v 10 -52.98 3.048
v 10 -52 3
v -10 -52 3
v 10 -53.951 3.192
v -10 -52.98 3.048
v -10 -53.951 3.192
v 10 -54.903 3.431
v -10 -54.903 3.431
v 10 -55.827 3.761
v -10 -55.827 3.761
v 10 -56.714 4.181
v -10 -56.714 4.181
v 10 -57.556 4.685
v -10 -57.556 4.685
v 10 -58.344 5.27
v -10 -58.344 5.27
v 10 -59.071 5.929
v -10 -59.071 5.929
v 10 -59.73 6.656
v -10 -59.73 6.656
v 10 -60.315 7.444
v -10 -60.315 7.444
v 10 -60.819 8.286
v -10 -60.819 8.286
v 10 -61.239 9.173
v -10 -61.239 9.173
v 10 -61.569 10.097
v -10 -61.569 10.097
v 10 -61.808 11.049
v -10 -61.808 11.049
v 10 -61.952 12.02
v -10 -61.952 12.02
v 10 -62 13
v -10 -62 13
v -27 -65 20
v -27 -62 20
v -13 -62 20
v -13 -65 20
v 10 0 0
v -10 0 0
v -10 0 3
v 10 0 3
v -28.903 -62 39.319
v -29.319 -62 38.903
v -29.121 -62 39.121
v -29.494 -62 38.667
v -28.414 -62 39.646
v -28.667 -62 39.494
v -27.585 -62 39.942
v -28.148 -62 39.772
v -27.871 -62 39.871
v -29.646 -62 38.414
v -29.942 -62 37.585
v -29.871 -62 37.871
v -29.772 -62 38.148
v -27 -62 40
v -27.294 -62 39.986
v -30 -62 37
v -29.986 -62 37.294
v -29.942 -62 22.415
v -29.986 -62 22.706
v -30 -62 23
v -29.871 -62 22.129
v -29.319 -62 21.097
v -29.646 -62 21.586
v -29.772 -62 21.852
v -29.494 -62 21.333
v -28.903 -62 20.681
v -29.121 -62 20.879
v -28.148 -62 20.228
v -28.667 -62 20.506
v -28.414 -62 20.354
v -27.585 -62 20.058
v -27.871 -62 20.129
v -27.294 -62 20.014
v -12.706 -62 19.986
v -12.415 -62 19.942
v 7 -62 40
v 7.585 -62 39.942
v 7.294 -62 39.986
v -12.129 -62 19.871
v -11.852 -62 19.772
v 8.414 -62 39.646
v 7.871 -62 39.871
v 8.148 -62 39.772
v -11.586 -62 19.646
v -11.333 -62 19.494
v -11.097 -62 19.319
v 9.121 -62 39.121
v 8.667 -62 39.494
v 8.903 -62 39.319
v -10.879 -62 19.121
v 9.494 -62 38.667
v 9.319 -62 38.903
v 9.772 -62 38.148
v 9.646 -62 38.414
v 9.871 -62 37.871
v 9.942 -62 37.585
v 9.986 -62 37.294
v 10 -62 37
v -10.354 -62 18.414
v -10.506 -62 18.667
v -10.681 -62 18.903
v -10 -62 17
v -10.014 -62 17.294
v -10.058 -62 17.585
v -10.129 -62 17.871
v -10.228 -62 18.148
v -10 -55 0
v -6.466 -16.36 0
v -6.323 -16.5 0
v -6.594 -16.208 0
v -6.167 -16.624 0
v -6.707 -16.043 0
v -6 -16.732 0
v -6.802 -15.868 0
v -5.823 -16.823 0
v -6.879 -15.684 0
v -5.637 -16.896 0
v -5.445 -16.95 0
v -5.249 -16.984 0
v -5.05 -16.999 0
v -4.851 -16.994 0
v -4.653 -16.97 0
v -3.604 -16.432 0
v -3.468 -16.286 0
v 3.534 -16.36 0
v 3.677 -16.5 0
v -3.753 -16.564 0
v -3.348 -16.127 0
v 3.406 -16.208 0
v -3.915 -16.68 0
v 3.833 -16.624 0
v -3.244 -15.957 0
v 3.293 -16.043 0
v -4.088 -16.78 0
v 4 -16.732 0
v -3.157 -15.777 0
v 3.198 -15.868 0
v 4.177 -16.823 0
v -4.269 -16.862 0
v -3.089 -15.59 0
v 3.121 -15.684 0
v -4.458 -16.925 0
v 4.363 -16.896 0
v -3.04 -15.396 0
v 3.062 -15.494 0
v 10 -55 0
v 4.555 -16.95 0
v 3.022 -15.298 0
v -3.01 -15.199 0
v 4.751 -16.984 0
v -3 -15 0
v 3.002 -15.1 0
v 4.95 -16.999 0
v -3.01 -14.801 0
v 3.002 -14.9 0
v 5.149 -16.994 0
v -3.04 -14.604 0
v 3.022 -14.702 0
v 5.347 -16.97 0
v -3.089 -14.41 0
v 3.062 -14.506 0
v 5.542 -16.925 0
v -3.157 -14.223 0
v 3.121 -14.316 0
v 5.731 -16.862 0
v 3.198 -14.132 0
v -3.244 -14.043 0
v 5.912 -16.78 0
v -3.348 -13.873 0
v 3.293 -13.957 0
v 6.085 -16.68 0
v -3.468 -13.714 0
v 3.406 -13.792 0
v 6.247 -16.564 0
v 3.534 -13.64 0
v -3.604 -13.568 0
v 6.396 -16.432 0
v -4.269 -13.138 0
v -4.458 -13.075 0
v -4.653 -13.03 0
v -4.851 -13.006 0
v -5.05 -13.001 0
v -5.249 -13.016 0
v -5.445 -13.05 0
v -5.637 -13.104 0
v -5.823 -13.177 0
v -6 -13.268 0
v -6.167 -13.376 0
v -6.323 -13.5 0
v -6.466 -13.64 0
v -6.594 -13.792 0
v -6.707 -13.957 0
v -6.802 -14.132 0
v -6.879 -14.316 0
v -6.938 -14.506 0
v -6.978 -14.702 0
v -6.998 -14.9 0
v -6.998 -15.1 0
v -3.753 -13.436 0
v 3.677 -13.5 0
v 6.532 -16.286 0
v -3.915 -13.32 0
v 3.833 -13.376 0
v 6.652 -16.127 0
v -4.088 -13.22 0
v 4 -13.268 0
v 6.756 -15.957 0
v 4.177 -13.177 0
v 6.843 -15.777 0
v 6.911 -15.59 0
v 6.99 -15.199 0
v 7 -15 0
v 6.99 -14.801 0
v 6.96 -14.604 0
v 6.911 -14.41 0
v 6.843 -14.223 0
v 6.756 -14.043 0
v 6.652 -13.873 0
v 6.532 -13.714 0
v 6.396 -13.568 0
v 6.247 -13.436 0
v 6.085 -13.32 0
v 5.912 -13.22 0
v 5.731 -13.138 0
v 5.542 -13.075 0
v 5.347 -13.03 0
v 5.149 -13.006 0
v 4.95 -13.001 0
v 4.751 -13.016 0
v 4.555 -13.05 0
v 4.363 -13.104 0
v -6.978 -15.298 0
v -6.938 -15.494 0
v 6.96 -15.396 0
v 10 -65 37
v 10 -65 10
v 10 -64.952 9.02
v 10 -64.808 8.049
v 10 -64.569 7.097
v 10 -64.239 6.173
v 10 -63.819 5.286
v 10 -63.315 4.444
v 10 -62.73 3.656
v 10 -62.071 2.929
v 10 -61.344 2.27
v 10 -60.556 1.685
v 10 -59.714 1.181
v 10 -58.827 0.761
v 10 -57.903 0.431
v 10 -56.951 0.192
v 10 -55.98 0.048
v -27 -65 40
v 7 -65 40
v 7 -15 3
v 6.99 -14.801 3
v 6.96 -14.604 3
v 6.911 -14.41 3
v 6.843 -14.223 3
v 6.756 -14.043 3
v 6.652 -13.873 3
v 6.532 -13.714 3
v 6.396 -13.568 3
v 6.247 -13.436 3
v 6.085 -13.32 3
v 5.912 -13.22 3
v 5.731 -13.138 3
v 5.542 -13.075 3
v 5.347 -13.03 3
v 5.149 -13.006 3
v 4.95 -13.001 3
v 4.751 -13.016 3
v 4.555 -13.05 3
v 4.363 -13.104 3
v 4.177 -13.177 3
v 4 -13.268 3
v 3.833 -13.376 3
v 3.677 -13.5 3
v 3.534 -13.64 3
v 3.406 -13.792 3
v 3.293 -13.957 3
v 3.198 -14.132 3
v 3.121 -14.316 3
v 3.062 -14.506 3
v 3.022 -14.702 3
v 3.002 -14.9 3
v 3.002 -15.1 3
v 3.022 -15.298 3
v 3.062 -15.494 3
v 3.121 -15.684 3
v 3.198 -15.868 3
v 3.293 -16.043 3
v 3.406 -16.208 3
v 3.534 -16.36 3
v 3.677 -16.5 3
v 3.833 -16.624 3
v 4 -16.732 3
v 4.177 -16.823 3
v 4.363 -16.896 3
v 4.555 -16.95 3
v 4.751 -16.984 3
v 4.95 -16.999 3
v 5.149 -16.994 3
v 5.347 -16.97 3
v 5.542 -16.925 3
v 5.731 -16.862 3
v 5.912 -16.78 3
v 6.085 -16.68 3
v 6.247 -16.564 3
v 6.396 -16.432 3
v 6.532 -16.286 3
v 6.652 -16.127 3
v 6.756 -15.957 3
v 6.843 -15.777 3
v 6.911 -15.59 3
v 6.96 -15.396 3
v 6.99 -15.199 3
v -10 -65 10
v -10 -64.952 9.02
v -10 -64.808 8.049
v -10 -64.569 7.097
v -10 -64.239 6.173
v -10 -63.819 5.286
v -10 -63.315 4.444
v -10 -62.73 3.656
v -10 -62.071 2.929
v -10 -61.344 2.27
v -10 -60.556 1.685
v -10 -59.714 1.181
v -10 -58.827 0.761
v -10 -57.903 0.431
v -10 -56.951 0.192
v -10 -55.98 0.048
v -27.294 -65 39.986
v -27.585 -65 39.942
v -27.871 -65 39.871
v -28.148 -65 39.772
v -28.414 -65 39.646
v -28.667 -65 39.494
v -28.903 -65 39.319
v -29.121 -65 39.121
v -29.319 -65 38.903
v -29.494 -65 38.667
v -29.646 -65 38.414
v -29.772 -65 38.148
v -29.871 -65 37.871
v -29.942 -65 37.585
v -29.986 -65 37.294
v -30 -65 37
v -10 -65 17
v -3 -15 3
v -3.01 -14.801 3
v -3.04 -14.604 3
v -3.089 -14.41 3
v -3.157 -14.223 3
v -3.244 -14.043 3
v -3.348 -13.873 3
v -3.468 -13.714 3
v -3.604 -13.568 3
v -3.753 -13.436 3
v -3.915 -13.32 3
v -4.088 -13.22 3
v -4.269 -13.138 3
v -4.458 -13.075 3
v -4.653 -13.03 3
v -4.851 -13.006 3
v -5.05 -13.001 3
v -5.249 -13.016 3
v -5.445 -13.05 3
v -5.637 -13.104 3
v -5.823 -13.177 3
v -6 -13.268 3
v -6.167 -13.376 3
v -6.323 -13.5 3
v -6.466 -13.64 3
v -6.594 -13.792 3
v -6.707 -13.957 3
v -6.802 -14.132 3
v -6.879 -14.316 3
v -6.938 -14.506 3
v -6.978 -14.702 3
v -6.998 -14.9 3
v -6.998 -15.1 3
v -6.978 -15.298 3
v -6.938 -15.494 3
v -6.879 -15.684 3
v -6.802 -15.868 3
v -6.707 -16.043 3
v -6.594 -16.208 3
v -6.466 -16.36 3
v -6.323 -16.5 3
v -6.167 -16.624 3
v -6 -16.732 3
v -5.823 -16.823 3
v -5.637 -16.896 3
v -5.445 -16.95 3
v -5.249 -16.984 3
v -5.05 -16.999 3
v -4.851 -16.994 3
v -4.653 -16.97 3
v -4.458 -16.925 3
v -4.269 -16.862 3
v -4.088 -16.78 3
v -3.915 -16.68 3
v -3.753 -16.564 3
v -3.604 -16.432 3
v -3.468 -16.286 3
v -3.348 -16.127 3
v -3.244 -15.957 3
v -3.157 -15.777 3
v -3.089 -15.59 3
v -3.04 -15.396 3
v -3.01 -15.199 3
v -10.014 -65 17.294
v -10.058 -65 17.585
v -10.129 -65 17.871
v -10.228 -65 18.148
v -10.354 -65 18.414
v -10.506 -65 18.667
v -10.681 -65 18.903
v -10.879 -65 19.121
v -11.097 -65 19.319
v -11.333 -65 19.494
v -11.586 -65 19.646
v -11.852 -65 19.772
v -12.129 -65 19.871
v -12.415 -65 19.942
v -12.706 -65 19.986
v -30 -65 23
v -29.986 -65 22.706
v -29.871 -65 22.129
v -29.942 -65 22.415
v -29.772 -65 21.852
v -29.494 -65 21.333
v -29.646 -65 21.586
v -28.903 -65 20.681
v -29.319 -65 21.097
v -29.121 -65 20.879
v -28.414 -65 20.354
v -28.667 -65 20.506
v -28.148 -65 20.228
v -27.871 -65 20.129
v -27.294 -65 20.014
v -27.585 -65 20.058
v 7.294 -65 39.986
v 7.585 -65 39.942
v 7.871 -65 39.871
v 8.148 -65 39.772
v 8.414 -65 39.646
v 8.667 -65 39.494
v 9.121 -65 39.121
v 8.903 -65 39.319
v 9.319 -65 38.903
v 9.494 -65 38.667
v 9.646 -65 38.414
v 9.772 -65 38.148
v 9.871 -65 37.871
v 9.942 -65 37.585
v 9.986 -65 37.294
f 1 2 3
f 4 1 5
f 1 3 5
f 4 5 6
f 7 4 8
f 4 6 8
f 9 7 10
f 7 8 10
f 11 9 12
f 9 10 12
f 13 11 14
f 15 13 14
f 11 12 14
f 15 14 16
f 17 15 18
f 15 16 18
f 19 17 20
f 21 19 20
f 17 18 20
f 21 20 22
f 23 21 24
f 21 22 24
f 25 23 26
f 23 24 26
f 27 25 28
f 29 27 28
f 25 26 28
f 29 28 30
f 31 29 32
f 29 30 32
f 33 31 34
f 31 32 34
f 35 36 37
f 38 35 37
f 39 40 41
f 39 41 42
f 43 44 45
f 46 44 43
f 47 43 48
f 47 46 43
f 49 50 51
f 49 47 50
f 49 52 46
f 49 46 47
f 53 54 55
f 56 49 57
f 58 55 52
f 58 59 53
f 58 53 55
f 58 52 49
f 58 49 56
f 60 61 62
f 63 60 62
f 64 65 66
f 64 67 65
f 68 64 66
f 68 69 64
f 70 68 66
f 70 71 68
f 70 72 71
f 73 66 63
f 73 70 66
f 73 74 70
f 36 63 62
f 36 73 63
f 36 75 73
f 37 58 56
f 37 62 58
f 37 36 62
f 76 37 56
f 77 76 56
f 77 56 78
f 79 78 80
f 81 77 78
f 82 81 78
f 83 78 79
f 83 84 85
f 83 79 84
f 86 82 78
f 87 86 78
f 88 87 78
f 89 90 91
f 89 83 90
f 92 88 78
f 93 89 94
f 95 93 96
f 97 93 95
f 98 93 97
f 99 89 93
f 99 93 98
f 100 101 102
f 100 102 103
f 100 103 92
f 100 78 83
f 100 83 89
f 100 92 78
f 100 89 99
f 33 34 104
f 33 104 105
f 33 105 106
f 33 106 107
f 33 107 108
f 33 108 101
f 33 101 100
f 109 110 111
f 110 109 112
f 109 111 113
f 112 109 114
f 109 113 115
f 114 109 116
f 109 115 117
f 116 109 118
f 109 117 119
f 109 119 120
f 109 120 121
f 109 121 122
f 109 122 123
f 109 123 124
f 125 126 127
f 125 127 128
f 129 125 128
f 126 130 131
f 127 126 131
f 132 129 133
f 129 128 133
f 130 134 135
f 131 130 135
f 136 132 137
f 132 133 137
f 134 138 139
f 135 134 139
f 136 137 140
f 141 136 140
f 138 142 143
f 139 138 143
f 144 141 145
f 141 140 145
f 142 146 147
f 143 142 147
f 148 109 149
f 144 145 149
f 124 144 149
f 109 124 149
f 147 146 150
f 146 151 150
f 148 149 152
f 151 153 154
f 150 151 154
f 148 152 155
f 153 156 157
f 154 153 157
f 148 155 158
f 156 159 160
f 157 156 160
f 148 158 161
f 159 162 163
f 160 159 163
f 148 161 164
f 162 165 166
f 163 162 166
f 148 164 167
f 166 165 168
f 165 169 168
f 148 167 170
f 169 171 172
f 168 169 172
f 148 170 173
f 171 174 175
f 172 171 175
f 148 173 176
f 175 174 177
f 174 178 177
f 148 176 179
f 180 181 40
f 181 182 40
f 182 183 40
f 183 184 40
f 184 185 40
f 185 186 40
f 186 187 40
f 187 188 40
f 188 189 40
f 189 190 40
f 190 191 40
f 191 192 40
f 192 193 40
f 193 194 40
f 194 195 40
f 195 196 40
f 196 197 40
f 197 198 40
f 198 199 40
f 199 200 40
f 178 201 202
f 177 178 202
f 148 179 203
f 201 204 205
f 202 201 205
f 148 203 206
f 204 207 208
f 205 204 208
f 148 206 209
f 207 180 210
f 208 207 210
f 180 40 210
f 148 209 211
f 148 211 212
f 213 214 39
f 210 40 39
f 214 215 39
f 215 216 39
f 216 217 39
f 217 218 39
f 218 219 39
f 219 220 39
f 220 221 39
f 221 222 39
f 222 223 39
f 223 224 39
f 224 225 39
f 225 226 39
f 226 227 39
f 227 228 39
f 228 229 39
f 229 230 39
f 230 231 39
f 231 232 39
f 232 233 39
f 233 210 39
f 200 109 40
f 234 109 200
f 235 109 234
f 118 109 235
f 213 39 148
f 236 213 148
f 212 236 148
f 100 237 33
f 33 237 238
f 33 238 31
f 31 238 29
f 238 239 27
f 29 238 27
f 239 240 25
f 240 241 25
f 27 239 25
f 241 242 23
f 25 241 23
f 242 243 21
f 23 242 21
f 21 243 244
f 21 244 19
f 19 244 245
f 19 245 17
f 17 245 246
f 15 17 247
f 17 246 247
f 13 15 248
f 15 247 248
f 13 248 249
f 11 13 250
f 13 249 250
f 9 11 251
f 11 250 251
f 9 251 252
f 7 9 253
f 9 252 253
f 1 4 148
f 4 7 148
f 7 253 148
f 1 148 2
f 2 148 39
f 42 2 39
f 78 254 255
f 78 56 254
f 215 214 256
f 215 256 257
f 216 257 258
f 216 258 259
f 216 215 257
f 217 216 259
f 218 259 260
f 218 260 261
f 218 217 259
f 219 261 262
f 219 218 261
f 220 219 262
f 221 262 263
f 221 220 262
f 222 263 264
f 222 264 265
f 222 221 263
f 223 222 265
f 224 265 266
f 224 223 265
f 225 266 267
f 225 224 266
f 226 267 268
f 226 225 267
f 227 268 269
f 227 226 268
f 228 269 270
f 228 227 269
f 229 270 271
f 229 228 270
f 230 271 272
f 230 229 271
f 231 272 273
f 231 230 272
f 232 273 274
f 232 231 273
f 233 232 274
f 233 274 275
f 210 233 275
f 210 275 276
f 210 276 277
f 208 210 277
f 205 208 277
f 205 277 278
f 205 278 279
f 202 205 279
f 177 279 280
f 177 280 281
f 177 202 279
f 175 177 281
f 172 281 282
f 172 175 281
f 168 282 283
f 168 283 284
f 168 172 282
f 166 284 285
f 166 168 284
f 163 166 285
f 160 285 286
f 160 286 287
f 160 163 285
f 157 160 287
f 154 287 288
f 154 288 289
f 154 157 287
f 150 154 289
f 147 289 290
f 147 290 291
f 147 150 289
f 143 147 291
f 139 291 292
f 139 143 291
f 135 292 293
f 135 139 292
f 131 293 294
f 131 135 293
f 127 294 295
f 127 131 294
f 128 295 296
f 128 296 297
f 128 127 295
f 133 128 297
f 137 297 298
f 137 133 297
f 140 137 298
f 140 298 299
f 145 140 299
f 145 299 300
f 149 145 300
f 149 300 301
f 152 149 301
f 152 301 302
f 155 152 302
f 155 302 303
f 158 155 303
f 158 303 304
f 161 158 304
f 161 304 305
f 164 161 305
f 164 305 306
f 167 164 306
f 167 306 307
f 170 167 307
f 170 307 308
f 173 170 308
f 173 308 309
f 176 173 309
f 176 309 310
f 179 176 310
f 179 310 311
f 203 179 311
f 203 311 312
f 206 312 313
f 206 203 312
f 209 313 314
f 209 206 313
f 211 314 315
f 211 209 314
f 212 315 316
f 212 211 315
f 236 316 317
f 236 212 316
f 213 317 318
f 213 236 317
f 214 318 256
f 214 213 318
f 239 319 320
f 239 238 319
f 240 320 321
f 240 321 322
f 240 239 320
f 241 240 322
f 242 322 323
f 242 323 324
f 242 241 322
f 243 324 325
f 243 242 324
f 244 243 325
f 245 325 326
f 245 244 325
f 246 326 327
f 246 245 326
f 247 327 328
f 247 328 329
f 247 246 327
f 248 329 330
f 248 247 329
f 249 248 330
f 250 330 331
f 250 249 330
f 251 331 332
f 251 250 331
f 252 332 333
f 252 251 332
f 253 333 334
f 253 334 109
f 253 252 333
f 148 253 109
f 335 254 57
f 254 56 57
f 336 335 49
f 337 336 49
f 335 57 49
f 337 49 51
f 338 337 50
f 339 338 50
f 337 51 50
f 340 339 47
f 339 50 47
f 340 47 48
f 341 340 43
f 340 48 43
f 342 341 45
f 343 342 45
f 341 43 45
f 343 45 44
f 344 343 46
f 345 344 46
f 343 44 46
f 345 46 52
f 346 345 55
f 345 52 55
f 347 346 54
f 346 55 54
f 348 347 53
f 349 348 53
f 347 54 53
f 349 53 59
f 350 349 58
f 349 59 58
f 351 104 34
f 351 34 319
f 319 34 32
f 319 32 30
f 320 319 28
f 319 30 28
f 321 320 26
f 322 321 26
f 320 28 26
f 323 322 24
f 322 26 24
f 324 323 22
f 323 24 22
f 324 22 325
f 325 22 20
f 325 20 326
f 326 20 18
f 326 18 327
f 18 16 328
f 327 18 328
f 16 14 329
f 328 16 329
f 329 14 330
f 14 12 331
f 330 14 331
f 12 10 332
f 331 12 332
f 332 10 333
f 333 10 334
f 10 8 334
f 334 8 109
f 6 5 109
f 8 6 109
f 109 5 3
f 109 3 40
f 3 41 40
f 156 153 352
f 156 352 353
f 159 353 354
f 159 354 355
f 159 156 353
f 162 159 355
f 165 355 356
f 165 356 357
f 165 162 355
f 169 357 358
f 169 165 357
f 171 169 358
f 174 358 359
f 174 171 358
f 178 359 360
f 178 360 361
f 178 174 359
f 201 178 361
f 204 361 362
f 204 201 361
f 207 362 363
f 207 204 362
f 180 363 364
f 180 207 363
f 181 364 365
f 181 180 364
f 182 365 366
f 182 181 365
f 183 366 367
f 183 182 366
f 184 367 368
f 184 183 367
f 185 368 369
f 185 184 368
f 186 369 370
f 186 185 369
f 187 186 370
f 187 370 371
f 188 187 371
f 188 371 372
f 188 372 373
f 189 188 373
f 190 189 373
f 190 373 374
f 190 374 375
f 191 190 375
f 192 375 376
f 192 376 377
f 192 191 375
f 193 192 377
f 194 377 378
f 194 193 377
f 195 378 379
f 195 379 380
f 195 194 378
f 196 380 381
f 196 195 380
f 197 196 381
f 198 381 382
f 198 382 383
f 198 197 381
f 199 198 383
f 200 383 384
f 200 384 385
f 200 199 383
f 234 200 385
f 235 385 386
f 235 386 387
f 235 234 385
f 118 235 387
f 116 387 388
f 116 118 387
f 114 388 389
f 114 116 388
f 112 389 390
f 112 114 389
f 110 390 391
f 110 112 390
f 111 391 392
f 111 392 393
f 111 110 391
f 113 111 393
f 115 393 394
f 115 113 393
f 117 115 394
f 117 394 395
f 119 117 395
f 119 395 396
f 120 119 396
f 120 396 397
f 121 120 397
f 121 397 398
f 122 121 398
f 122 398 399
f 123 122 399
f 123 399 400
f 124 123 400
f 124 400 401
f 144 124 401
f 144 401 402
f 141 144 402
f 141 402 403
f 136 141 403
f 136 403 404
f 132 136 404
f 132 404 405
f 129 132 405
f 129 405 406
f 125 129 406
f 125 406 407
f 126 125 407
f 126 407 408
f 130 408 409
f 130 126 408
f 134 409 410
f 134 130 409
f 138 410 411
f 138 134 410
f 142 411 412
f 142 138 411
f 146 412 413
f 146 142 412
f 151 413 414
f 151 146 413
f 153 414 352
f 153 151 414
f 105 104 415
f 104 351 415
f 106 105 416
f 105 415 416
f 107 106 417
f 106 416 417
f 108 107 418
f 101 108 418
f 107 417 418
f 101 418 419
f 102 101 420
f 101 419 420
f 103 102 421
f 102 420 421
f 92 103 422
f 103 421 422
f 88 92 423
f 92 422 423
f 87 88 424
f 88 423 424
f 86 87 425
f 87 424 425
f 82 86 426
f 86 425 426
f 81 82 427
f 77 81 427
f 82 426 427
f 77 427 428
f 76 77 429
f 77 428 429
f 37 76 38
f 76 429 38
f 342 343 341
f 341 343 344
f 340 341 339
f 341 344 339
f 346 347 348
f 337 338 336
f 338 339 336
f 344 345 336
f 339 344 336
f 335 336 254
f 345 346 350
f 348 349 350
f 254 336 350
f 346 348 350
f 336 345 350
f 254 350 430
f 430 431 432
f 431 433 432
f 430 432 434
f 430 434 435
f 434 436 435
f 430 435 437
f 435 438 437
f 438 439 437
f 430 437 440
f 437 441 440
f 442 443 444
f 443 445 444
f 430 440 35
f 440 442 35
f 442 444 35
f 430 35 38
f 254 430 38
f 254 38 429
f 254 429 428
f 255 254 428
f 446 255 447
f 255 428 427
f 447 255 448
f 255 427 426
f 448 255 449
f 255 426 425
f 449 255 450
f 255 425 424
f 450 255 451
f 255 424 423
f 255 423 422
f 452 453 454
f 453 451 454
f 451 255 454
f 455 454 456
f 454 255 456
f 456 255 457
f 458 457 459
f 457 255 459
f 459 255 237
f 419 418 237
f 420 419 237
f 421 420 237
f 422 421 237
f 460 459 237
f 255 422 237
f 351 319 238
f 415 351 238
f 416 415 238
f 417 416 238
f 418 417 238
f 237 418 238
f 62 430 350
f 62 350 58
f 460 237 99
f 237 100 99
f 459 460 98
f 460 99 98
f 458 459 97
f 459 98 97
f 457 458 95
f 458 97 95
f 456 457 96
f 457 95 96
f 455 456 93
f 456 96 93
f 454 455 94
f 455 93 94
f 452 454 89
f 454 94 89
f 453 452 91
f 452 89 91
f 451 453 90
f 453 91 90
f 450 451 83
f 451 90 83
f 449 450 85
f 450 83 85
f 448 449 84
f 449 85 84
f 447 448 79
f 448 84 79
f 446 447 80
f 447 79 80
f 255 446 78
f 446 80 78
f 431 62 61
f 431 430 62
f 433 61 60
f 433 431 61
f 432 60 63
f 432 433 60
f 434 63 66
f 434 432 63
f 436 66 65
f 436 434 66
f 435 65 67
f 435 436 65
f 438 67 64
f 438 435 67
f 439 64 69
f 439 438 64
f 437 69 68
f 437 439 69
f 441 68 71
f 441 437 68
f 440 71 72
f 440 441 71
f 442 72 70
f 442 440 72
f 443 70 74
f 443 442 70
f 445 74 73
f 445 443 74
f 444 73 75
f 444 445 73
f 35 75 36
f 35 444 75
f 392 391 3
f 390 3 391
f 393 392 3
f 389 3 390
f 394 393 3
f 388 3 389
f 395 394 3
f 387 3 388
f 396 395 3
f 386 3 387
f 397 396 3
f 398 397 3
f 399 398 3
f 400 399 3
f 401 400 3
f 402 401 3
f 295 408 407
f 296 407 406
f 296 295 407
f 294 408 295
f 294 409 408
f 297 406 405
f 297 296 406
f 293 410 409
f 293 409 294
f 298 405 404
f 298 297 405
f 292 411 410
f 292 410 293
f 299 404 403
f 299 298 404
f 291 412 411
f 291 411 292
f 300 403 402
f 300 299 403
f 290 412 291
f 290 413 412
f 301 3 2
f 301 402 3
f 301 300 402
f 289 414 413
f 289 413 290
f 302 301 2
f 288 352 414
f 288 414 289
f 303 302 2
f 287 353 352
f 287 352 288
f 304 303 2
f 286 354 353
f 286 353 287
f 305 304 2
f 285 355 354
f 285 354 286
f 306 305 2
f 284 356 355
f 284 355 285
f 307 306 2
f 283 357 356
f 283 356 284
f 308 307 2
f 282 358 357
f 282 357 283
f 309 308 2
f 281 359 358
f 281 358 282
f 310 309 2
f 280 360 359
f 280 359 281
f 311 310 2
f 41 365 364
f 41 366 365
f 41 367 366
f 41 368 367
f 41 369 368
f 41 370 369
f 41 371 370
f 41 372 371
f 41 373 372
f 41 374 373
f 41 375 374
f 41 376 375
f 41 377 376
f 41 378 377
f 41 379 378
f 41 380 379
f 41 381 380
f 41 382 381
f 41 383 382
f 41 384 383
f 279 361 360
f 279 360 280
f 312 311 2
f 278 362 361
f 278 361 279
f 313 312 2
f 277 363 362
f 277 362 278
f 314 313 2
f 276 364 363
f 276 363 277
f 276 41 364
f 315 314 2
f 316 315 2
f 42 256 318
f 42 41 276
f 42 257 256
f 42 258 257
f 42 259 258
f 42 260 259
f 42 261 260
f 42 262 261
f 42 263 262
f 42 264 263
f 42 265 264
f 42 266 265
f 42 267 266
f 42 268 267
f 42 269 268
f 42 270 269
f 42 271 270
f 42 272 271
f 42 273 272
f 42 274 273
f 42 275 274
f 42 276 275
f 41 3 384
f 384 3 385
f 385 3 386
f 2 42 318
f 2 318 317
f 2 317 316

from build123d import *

# Parameters (mm, degrees)
SKETCH_1_W          = 20
SKETCH_1_H          = 65
SKETCH_1_R          = 2
EXTRUDE_1_DEPTH     = 3
SKETCH_2_W          = 40
SKETCH_2_H          = 3
EXTRUDE_2_DEPTH     = 40
SKETCH_3_W          = 20
SKETCH_3_H          = 20
CUT_EXTRUDE_1_DEPTH = 3
FILLET_1_R          = 10
FILLET_2_R          = 3


with BuildPart() as part:
    # 草图1 → 凸台-拉伸1 (new body)
    with BuildSketch(Plane.XY):
        with Locations((0, -32.5)):
            Rectangle(SKETCH_1_W, SKETCH_1_H)
        with Locations((-5, -15)):
            Circle(SKETCH_1_R, mode=Mode.SUBTRACT)
        with Locations((5, -15)):
            Circle(SKETCH_1_R, mode=Mode.SUBTRACT)
    extrude(amount=EXTRUDE_1_DEPTH)

    # 草图2 → 凸台-拉伸2 (add)
    with BuildSketch(Plane.XY):
        with Locations((-10, -63.5)):
            Rectangle(SKETCH_2_W, SKETCH_2_H)
    extrude(amount=EXTRUDE_2_DEPTH)

    # 草图3 → 切除-拉伸1 (cut)
    with BuildSketch(Plane(origin=(0, -62, 0), x_dir=(1, 0, 0), z_dir=(0, 1, 0))):
        with Locations((-20, -10)):
            Rectangle(SKETCH_3_W, SKETCH_3_H)
    extrude(amount=-CUT_EXTRUDE_1_DEPTH, mode=Mode.SUBTRACT)

    # 圆角1
    fillet_1_edges = [part.edges().sort_by_distance(p)[0] for p in [
        (0, -62, 3),
        (0, -65, 0),
    ]]
    fillet(fillet_1_edges, radius=FILLET_1_R)

    # 圆角2
    fillet_2_edges = [part.edges().sort_by_distance(p)[0] for p in [
        (-30, -63.5, 40),
        (10, -63.5, 40),
        (-30, -63.5, 20),
        (-10, -63.5, 20),
    ]]
    fillet(fillet_2_edges, radius=FILLET_2_R)


solid = part.part
